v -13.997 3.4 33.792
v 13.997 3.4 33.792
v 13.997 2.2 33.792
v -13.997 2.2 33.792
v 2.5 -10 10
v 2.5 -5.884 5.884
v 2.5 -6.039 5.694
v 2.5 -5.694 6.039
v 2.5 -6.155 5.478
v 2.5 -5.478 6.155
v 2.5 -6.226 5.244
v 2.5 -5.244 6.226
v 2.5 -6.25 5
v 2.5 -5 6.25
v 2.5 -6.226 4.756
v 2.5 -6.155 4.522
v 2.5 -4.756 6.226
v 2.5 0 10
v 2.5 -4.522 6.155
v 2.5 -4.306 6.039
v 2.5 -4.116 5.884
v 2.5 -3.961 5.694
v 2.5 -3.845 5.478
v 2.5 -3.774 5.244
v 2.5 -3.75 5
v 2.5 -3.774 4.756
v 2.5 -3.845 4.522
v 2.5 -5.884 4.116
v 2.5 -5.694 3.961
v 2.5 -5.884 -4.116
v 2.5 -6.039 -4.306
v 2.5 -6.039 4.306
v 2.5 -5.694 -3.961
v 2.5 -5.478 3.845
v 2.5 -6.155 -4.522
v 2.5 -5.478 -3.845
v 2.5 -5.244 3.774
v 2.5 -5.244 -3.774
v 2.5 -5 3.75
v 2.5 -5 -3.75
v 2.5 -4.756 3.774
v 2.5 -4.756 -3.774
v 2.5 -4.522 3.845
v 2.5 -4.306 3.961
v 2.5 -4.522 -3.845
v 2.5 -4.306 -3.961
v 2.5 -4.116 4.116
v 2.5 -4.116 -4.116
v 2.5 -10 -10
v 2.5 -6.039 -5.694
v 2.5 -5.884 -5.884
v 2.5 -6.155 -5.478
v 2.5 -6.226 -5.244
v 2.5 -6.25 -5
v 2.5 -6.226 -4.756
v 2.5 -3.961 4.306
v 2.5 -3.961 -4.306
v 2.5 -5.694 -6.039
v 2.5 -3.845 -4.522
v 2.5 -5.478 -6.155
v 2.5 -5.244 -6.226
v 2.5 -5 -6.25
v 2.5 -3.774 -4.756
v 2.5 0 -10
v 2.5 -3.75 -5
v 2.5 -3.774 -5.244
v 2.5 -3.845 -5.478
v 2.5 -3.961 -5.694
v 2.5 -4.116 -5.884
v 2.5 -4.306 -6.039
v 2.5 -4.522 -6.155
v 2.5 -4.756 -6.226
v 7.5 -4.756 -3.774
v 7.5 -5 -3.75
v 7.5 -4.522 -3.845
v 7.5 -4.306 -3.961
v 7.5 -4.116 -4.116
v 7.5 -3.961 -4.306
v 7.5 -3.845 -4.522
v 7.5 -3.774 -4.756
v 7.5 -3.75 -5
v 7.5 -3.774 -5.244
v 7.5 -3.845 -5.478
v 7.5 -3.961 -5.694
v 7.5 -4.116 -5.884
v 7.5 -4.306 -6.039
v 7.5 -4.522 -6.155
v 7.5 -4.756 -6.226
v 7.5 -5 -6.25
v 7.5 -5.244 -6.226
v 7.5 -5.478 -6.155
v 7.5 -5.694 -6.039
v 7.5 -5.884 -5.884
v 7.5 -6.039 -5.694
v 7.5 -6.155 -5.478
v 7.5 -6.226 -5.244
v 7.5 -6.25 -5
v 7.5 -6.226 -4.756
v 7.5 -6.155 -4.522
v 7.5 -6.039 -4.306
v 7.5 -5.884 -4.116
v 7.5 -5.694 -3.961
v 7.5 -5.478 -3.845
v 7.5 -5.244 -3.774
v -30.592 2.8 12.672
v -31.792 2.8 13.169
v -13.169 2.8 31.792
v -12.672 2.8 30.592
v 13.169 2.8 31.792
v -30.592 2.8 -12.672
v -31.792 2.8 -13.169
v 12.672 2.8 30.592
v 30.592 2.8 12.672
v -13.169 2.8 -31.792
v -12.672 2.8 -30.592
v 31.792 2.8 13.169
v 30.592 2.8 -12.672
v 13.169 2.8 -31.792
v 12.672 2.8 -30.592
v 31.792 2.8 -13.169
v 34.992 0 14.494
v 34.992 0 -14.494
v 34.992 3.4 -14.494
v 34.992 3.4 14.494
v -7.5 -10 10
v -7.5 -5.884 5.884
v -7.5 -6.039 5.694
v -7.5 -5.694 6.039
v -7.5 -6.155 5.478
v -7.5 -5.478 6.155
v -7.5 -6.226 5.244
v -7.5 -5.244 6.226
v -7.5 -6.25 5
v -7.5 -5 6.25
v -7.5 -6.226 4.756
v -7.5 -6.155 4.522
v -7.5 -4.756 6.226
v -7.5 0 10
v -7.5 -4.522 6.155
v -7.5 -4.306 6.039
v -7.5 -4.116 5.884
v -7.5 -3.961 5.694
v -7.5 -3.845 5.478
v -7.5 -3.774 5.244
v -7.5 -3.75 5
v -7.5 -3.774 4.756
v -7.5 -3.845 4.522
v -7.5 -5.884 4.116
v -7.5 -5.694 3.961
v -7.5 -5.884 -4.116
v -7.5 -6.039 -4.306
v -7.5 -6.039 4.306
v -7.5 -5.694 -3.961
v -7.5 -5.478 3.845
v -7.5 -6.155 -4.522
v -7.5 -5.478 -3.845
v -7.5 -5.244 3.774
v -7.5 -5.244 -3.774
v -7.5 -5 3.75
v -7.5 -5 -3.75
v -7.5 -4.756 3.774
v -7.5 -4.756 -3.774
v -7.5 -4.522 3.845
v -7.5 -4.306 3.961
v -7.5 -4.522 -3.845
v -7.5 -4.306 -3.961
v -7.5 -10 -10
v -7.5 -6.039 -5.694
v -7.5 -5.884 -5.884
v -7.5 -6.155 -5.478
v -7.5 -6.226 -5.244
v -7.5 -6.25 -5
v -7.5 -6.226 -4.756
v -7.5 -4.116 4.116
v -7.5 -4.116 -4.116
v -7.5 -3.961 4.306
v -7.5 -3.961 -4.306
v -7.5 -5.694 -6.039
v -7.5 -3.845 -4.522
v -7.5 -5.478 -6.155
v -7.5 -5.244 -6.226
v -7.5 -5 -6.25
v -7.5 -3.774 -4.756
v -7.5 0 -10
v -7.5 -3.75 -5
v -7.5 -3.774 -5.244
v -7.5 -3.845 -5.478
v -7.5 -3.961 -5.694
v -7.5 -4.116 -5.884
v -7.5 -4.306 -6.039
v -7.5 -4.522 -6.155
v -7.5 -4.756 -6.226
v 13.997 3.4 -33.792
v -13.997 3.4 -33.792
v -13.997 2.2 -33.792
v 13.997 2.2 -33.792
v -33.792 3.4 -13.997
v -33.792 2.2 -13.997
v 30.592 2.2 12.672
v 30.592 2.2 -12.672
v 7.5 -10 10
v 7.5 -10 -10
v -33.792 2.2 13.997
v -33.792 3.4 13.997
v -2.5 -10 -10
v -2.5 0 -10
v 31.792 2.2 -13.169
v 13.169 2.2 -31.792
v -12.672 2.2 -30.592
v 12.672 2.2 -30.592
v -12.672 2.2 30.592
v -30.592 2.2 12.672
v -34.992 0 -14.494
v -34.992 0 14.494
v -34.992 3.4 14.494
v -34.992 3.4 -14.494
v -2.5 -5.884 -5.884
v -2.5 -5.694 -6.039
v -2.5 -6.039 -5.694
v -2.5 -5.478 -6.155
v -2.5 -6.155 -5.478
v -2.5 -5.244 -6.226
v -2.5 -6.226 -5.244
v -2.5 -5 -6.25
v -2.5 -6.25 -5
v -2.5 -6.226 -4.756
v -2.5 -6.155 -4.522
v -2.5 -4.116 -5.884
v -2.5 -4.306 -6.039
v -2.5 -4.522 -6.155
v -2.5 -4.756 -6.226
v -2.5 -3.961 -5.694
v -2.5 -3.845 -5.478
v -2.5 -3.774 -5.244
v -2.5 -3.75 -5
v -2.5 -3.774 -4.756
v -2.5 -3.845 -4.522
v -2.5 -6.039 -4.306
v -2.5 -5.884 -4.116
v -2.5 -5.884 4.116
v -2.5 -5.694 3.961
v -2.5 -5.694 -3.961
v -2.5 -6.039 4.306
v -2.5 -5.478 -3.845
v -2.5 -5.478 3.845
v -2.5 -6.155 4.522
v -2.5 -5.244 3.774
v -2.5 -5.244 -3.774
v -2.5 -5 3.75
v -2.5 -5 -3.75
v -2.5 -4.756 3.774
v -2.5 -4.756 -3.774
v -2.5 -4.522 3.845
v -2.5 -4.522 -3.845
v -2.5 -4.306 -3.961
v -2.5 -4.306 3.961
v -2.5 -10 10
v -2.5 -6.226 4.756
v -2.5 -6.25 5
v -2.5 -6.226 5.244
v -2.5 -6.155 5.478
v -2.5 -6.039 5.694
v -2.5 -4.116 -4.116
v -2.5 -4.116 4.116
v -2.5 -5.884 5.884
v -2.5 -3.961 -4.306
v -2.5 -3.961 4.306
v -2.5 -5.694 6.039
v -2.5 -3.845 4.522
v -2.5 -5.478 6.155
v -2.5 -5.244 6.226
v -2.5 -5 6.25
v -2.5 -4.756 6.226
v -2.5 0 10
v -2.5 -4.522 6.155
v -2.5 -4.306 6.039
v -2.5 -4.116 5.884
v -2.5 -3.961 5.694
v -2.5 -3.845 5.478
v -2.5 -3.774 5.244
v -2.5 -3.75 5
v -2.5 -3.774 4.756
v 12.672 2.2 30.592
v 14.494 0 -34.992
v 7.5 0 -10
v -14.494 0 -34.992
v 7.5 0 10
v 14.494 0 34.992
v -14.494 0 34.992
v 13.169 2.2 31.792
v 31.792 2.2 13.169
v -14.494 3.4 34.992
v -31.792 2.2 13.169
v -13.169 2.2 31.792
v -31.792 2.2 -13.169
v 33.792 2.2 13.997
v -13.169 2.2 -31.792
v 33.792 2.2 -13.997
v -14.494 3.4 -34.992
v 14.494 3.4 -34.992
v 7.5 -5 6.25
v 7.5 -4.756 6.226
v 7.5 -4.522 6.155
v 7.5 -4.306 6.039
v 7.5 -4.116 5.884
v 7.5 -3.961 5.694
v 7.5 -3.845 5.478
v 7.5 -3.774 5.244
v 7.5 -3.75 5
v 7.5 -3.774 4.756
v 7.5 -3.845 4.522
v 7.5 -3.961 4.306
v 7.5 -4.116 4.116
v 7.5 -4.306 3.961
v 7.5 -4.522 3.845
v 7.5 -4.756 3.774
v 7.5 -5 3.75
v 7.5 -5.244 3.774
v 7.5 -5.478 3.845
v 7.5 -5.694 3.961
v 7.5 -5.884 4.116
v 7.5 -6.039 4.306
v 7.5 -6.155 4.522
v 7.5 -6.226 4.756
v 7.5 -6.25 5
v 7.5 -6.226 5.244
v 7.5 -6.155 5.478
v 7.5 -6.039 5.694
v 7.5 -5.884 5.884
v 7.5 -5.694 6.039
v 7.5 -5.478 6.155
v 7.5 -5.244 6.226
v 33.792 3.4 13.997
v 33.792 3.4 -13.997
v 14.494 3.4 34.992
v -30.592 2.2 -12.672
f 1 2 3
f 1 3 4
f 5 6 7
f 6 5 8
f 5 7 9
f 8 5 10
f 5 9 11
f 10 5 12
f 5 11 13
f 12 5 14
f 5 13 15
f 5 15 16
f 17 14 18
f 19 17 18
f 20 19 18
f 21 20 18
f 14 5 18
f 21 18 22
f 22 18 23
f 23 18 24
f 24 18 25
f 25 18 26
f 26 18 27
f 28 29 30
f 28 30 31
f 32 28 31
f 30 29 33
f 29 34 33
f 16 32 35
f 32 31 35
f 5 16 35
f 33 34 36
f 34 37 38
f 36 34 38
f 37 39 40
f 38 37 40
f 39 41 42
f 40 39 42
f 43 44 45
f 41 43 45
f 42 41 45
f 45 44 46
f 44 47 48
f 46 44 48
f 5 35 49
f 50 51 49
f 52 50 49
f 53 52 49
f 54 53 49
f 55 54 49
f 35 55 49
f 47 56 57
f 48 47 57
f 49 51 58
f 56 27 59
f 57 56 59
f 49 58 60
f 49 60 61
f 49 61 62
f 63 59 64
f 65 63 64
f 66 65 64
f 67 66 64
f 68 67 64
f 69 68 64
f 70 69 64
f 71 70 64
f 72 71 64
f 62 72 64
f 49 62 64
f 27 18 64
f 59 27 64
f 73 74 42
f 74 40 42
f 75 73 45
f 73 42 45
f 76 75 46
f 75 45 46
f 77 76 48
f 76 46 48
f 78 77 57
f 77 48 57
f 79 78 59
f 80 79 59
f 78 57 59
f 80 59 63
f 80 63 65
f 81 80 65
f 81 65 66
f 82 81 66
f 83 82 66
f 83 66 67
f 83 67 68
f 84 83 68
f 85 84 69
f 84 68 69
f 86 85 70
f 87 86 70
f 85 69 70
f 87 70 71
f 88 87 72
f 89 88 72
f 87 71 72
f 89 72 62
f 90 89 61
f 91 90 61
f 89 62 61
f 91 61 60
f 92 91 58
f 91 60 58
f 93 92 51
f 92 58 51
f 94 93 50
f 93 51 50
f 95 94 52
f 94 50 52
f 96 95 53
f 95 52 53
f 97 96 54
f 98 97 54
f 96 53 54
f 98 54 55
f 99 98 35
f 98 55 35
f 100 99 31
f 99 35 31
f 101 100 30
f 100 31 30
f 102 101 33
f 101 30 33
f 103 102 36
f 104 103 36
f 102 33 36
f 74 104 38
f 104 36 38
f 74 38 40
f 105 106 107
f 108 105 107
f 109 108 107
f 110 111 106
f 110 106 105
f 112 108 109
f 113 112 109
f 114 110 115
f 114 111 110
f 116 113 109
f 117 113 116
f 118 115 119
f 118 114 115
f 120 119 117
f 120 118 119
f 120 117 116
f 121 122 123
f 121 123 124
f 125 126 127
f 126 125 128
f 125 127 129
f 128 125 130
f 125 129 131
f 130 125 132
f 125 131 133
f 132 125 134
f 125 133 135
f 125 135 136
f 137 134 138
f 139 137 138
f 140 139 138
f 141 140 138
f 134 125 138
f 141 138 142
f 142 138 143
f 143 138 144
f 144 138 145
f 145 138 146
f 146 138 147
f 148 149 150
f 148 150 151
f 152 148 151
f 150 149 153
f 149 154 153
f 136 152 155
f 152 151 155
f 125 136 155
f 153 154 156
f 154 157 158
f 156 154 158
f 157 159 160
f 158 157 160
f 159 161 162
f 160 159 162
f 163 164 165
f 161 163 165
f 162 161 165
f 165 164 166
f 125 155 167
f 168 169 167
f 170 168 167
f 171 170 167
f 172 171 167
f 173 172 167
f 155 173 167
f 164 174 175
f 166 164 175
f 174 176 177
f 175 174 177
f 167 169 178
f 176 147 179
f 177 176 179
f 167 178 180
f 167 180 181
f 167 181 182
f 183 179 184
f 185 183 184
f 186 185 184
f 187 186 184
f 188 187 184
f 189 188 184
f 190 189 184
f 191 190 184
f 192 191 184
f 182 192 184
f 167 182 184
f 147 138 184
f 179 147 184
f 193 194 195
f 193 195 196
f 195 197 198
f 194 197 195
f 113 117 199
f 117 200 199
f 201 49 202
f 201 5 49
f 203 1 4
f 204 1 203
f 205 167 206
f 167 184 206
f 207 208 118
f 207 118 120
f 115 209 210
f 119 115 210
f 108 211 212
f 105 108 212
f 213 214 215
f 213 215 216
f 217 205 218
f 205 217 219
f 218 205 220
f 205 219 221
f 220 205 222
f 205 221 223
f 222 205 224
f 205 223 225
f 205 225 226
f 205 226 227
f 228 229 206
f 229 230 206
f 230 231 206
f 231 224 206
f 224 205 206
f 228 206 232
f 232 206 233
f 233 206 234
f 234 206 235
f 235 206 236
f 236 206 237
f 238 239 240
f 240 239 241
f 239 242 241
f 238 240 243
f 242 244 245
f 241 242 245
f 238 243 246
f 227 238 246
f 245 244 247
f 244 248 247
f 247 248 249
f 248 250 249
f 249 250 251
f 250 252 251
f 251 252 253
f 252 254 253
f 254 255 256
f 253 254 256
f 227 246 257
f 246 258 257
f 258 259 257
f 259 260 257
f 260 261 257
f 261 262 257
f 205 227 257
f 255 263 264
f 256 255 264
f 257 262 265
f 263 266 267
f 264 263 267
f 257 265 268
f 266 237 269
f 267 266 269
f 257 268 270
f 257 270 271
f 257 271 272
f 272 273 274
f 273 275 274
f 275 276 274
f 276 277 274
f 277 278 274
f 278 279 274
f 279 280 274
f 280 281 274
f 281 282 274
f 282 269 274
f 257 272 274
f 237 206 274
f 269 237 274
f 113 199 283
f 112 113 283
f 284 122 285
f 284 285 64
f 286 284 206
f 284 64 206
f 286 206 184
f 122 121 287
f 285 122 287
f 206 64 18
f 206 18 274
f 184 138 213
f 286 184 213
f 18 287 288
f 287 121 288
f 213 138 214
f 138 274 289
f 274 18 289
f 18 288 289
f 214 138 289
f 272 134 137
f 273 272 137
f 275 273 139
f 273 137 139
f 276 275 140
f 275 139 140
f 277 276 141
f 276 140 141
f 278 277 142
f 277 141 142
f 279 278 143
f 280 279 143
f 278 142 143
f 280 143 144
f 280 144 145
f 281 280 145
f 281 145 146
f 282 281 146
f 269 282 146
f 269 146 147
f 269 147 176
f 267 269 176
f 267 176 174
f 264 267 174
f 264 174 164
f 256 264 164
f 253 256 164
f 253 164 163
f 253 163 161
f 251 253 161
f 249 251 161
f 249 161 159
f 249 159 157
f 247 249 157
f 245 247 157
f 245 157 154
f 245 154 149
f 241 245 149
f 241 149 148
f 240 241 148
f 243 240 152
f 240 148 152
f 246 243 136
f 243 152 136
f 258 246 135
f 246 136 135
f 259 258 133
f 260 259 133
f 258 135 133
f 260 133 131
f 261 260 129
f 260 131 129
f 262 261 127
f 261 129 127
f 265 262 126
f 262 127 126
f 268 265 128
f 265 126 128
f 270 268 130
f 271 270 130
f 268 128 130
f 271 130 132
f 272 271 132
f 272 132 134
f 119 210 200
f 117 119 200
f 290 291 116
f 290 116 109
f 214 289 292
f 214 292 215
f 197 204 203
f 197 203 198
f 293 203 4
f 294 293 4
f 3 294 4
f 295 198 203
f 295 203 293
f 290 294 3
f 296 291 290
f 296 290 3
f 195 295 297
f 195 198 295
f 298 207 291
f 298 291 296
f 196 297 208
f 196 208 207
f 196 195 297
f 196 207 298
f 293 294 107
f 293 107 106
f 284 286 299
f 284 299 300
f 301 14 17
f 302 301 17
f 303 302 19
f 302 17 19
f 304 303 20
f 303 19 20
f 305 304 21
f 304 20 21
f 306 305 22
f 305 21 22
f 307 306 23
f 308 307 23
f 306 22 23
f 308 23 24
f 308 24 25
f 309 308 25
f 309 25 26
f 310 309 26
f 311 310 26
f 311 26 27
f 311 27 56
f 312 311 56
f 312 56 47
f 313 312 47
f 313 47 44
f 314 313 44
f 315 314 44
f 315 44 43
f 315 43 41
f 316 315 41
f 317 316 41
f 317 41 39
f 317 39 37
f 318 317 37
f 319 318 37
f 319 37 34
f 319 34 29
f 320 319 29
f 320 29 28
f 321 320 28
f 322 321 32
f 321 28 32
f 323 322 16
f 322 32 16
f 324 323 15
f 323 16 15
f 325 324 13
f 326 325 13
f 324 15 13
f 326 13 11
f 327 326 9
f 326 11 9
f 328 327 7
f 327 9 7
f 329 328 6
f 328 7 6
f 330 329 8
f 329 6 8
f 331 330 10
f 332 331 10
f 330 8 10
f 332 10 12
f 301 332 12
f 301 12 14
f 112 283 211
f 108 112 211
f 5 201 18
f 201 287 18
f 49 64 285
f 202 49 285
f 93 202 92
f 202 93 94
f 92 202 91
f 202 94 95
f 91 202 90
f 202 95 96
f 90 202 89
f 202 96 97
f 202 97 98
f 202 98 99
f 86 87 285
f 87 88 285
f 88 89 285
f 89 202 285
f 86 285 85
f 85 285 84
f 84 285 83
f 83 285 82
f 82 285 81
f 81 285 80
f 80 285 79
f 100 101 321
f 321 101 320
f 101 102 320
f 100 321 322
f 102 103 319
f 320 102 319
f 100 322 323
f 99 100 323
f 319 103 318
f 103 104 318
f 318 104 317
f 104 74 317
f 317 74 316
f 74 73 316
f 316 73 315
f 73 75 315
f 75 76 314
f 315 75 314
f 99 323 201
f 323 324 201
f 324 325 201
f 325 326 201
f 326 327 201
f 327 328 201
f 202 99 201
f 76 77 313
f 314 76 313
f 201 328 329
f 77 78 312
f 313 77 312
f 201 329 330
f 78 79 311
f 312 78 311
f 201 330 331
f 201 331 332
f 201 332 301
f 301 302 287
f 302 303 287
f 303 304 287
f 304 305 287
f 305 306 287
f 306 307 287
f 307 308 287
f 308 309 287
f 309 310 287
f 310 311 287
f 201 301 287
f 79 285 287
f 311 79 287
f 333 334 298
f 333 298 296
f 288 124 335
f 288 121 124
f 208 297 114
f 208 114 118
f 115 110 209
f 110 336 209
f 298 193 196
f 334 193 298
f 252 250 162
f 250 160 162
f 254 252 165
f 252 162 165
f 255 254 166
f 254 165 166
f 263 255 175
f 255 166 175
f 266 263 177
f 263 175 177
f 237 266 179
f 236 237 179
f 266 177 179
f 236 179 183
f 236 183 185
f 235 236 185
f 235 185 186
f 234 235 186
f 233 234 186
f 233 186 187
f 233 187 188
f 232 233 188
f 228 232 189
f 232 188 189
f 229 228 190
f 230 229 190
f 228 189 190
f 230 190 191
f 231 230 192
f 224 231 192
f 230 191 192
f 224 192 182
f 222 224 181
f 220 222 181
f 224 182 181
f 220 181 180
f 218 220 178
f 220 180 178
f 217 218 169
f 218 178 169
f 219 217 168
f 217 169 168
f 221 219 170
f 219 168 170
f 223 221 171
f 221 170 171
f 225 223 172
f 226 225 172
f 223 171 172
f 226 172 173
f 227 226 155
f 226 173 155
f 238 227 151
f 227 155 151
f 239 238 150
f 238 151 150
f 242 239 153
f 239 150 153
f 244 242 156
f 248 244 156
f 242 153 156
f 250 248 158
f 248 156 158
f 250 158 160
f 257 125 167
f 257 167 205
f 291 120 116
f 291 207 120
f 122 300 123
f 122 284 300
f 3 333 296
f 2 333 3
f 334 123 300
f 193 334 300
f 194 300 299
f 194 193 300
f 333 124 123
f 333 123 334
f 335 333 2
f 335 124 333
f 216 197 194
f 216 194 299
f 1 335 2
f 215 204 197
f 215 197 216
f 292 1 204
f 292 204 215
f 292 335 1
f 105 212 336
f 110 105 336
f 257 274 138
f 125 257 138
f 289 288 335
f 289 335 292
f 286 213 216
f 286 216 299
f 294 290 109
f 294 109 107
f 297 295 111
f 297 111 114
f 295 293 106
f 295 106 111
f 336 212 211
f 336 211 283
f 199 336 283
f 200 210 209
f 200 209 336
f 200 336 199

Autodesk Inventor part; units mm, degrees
ref_plane "YZ Plane" through (0, 0, 0) normal (1, 0, 0) x (0, 1, 0)
ref_plane "XZ Plane" through (0, 0, 0) normal (0, 1, 0) x (-1, 0, 0)
ref_plane "XY Plane" through (0, 0, 0) normal (0, 0, 1) x (1, 0, 0)
sketch "스케치3" plane through (0, 0, 0) normal (0, 1, 0) x (-1, 0, 0)
  line L0 (34.9919, -14.4941) -> (14.4941, -34.9919)
  line L1 (14.4941, -34.9919) -> (-14.4941, -34.9919)
  line L2 (-14.4941, -34.9919) -> (-34.9919, -14.4941)
  line L3 (-34.9919, -14.4941) -> (-34.9919, 14.4941)
  line L4 (-34.9919, 14.4941) -> (-14.4941, 34.9919)
  line L5 (-14.4941, 34.9919) -> (14.4941, 34.9919)
  line L6 (14.4941, 34.9919) -> (34.9919, 14.4941)
  line L7 (34.9919, 14.4941) -> (34.9919, -14.4941)
  line L8 (13.5, -32.5919) -> (-13.5, -32.5919)
  line L9 (-13.5, -32.5919) -> (-32.5919, -13.5)
  line L10 (-32.5919, -13.5) -> (-32.5919, 13.5)
  line L11 (-32.5919, 13.5) -> (-13.5, 32.5919)
  line L12 (-13.5, 32.5919) -> (13.5, 32.5919)
  line L13 (13.5, 32.5919) -> (32.5919, 13.5)
  line L14 (32.5919, 13.5) -> (32.5919, -13.5)
  line L15 (32.5919, -13.5) -> (13.5, -32.5919)
  point P0 (0, 0)
  point P1 (0, 0)
  point P2 (0, 0)
  point P3 (0, 0)
  dimension "d66" = 27
  dimension "d67" = 2.4
extrude "돌출2" add sketch "스케치3" along normal blind 3.4 contours L0 L1 L2 L3 L4 L5 L6 L7 | L8 L9 L10 L11 L12 L13 L14 L15
sketch "스케치4" plane through (0, 3.4, 0) normal (0, 1, 0) x (1, 0, 0)
  line L0 (13.5, -32.5919) -> (-13.5, -32.5919)
  line L1 (-13.5, -32.5919) -> (-32.5919, -13.5)
  line L2 (-32.5919, -13.5) -> (-32.5919, 13.5)
  line L3 (-32.5919, 13.5) -> (-13.5, 32.5919)
  line L4 (-13.5, 32.5919) -> (13.5, 32.5919)
  line L5 (13.5, 32.5919) -> (32.5919, 13.5)
  line L6 (32.5919, 13.5) -> (32.5919, -13.5)
  line L7 (32.5919, -13.5) -> (13.5, -32.5919)
  line L8 (-13.9971, 33.7919) -> (13.9971, 33.7919)
  line L9 (13.9971, 33.7919) -> (33.7919, 13.9971)
  line L10 (33.7919, 13.9971) -> (33.7919, -13.9971)
  line L11 (33.7919, -13.9971) -> (13.9971, -33.7919)
  line L12 (13.9971, -33.7919) -> (-13.9971, -33.7919)
  line L13 (-13.9971, -33.7919) -> (-33.7919, -13.9971)
  line L14 (-33.7919, -13.9971) -> (-33.7919, 13.9971)
  line L15 (-33.7919, 13.9971) -> (-13.9971, 33.7919)
  line L16 (-13.1686, 31.7919) -> (13.1686, 31.7919)
  line L17 (13.1686, 31.7919) -> (31.7919, 13.1686)
  line L18 (31.7919, 13.1686) -> (31.7919, -13.1686)
  line L19 (31.7919, -13.1686) -> (13.1686, -31.7919)
  line L20 (13.1686, -31.7919) -> (-13.1686, -31.7919)
  line L21 (-13.1686, -31.7919) -> (-31.7919, -13.1686)
  line L22 (-31.7919, -13.1686) -> (-31.7919, 13.1686)
  line L23 (-31.7919, 13.1686) -> (-13.1686, 31.7919)
  point P0 (0, 0)
  point P1 (0, 0)
  point P2 (0, 0)
  point P3 (0, 0)
  dimension "d7" = 27
  dimension "d68" = 1.2
  dimension "d69" = 0.8
extrude "돌출3" cut sketch "스케치4" against normal blind 1.2 contours L0 L1 L2 L3 L4 L5 L6 L7 | L8 L9 L10 L11 L12 L13 L14 L15 | L16 L17 L18 L19 L20 L21 L22 L23
sketch "스케치9" plane through (0, 0, 0) normal (0, -1, 0) x (1, 0, 0)
  line L0 (7.5, 10) -> (2.5, 10)
  line L1 (2.5, 10) -> (2.5, -10)
  line L2 (2.5, -10) -> (7.5, -10)
  line L3 (7.5, -10) -> (7.5, 10)
  line L4 (7.5, 10) -> (2.5, -10) construction
  line L5 (2.5, 10) -> (7.5, -10) construction
  line L6 (-2.5, 10) -> (-7.5, 10)
  line L7 (-7.5, 10) -> (-7.5, -10)
  line L8 (-7.5, -10) -> (-2.5, -10)
  line L9 (-2.5, 10) -> (-7.5, -10) construction
  line L10 (-7.5, 10) -> (-2.5, -10) construction
  line L11 (-2.5, -10) -> (-2.5, 10)
  point P0 (0, 0)
  point P1 (5, 0)
  point P2 (-5, 0)
  dimension "d42" = 20
  dimension "d43" = 5
  dimension "d44" = 2.5
  dimension "d47" = 10
extrude "돌출8" add sketch "스케치9" along normal blind 10
sketch "스케치10" plane through (-7.5, 0, -10) normal (-1, 0, 0) x (0, 0, 1)
  circle A0 centre (15, -5) radius 1.25
  line L0 (19.9591, 0) -> (0.0886, 0)
  line L1 (24.4941, 0) -> (-4.4941, 0) projected
  circle A1 centre (5, -5) radius 1.25
  line L2 (20, 0) -> (20, -10) projected
  point P0 (10, 0)
  dimension "d54" = 2.5
  dimension "d57" = 10
  dimension "d62" = 5
  dimension "d63" = 5
extrude "돌출9" cut sketch "스케치10" against normal blind 20
sketch "스케치11" plane through (0, 2.2, 0) normal (0, 1, 0) x (1, 0, 0)
  line L0 (-13.1686, 31.7919) -> (13.1686, 31.7919)
  line L1 (13.1686, 31.7919) -> (31.7919, 13.1686)
  line L2 (31.7919, 13.1686) -> (31.7919, -13.1686)
  line L3 (31.7919, -13.1686) -> (13.1686, -31.7919)
  line L4 (13.1686, -31.7919) -> (-13.1686, -31.7919)
  line L5 (-13.1686, -31.7919) -> (-31.7919, -13.1686)
  line L6 (-31.7919, -13.1686) -> (-31.7919, 13.1686)
  line L7 (-31.7919, 13.1686) -> (-13.1686, 31.7919)
  line L8 (-13.9971, 33.7919) -> (13.9971, 33.7919) projected
  line L9 (-12.6716, 30.5919) -> (12.6716, 30.5919)
  line L10 (12.6716, 30.5919) -> (30.5919, 12.6716)
  line L11 (30.5919, 12.6716) -> (30.5919, -12.6716)
  line L12 (30.5919, -12.6716) -> (12.6716, -30.5919)
  line L13 (12.6716, -30.5919) -> (-12.6716, -30.5919)
  line L14 (-12.6716, -30.5919) -> (-30.5919, -12.6716)
  line L15 (-30.5919, -12.6716) -> (-30.5919, 12.6716)
  line L16 (-30.5919, 12.6716) -> (-12.6716, 30.5919)
  point P0 (0, 0)
  point P1 (0, 0)
  point P2 (0, 0)
  dimension "d70" = 2
  dimension "d71" = 1.2
extrude "돌출10" add sketch "스케치11" along normal blind 0.6
properties part number "팔각형 OV-PAM 5패턴 하단 - 틈 너비 수정"
